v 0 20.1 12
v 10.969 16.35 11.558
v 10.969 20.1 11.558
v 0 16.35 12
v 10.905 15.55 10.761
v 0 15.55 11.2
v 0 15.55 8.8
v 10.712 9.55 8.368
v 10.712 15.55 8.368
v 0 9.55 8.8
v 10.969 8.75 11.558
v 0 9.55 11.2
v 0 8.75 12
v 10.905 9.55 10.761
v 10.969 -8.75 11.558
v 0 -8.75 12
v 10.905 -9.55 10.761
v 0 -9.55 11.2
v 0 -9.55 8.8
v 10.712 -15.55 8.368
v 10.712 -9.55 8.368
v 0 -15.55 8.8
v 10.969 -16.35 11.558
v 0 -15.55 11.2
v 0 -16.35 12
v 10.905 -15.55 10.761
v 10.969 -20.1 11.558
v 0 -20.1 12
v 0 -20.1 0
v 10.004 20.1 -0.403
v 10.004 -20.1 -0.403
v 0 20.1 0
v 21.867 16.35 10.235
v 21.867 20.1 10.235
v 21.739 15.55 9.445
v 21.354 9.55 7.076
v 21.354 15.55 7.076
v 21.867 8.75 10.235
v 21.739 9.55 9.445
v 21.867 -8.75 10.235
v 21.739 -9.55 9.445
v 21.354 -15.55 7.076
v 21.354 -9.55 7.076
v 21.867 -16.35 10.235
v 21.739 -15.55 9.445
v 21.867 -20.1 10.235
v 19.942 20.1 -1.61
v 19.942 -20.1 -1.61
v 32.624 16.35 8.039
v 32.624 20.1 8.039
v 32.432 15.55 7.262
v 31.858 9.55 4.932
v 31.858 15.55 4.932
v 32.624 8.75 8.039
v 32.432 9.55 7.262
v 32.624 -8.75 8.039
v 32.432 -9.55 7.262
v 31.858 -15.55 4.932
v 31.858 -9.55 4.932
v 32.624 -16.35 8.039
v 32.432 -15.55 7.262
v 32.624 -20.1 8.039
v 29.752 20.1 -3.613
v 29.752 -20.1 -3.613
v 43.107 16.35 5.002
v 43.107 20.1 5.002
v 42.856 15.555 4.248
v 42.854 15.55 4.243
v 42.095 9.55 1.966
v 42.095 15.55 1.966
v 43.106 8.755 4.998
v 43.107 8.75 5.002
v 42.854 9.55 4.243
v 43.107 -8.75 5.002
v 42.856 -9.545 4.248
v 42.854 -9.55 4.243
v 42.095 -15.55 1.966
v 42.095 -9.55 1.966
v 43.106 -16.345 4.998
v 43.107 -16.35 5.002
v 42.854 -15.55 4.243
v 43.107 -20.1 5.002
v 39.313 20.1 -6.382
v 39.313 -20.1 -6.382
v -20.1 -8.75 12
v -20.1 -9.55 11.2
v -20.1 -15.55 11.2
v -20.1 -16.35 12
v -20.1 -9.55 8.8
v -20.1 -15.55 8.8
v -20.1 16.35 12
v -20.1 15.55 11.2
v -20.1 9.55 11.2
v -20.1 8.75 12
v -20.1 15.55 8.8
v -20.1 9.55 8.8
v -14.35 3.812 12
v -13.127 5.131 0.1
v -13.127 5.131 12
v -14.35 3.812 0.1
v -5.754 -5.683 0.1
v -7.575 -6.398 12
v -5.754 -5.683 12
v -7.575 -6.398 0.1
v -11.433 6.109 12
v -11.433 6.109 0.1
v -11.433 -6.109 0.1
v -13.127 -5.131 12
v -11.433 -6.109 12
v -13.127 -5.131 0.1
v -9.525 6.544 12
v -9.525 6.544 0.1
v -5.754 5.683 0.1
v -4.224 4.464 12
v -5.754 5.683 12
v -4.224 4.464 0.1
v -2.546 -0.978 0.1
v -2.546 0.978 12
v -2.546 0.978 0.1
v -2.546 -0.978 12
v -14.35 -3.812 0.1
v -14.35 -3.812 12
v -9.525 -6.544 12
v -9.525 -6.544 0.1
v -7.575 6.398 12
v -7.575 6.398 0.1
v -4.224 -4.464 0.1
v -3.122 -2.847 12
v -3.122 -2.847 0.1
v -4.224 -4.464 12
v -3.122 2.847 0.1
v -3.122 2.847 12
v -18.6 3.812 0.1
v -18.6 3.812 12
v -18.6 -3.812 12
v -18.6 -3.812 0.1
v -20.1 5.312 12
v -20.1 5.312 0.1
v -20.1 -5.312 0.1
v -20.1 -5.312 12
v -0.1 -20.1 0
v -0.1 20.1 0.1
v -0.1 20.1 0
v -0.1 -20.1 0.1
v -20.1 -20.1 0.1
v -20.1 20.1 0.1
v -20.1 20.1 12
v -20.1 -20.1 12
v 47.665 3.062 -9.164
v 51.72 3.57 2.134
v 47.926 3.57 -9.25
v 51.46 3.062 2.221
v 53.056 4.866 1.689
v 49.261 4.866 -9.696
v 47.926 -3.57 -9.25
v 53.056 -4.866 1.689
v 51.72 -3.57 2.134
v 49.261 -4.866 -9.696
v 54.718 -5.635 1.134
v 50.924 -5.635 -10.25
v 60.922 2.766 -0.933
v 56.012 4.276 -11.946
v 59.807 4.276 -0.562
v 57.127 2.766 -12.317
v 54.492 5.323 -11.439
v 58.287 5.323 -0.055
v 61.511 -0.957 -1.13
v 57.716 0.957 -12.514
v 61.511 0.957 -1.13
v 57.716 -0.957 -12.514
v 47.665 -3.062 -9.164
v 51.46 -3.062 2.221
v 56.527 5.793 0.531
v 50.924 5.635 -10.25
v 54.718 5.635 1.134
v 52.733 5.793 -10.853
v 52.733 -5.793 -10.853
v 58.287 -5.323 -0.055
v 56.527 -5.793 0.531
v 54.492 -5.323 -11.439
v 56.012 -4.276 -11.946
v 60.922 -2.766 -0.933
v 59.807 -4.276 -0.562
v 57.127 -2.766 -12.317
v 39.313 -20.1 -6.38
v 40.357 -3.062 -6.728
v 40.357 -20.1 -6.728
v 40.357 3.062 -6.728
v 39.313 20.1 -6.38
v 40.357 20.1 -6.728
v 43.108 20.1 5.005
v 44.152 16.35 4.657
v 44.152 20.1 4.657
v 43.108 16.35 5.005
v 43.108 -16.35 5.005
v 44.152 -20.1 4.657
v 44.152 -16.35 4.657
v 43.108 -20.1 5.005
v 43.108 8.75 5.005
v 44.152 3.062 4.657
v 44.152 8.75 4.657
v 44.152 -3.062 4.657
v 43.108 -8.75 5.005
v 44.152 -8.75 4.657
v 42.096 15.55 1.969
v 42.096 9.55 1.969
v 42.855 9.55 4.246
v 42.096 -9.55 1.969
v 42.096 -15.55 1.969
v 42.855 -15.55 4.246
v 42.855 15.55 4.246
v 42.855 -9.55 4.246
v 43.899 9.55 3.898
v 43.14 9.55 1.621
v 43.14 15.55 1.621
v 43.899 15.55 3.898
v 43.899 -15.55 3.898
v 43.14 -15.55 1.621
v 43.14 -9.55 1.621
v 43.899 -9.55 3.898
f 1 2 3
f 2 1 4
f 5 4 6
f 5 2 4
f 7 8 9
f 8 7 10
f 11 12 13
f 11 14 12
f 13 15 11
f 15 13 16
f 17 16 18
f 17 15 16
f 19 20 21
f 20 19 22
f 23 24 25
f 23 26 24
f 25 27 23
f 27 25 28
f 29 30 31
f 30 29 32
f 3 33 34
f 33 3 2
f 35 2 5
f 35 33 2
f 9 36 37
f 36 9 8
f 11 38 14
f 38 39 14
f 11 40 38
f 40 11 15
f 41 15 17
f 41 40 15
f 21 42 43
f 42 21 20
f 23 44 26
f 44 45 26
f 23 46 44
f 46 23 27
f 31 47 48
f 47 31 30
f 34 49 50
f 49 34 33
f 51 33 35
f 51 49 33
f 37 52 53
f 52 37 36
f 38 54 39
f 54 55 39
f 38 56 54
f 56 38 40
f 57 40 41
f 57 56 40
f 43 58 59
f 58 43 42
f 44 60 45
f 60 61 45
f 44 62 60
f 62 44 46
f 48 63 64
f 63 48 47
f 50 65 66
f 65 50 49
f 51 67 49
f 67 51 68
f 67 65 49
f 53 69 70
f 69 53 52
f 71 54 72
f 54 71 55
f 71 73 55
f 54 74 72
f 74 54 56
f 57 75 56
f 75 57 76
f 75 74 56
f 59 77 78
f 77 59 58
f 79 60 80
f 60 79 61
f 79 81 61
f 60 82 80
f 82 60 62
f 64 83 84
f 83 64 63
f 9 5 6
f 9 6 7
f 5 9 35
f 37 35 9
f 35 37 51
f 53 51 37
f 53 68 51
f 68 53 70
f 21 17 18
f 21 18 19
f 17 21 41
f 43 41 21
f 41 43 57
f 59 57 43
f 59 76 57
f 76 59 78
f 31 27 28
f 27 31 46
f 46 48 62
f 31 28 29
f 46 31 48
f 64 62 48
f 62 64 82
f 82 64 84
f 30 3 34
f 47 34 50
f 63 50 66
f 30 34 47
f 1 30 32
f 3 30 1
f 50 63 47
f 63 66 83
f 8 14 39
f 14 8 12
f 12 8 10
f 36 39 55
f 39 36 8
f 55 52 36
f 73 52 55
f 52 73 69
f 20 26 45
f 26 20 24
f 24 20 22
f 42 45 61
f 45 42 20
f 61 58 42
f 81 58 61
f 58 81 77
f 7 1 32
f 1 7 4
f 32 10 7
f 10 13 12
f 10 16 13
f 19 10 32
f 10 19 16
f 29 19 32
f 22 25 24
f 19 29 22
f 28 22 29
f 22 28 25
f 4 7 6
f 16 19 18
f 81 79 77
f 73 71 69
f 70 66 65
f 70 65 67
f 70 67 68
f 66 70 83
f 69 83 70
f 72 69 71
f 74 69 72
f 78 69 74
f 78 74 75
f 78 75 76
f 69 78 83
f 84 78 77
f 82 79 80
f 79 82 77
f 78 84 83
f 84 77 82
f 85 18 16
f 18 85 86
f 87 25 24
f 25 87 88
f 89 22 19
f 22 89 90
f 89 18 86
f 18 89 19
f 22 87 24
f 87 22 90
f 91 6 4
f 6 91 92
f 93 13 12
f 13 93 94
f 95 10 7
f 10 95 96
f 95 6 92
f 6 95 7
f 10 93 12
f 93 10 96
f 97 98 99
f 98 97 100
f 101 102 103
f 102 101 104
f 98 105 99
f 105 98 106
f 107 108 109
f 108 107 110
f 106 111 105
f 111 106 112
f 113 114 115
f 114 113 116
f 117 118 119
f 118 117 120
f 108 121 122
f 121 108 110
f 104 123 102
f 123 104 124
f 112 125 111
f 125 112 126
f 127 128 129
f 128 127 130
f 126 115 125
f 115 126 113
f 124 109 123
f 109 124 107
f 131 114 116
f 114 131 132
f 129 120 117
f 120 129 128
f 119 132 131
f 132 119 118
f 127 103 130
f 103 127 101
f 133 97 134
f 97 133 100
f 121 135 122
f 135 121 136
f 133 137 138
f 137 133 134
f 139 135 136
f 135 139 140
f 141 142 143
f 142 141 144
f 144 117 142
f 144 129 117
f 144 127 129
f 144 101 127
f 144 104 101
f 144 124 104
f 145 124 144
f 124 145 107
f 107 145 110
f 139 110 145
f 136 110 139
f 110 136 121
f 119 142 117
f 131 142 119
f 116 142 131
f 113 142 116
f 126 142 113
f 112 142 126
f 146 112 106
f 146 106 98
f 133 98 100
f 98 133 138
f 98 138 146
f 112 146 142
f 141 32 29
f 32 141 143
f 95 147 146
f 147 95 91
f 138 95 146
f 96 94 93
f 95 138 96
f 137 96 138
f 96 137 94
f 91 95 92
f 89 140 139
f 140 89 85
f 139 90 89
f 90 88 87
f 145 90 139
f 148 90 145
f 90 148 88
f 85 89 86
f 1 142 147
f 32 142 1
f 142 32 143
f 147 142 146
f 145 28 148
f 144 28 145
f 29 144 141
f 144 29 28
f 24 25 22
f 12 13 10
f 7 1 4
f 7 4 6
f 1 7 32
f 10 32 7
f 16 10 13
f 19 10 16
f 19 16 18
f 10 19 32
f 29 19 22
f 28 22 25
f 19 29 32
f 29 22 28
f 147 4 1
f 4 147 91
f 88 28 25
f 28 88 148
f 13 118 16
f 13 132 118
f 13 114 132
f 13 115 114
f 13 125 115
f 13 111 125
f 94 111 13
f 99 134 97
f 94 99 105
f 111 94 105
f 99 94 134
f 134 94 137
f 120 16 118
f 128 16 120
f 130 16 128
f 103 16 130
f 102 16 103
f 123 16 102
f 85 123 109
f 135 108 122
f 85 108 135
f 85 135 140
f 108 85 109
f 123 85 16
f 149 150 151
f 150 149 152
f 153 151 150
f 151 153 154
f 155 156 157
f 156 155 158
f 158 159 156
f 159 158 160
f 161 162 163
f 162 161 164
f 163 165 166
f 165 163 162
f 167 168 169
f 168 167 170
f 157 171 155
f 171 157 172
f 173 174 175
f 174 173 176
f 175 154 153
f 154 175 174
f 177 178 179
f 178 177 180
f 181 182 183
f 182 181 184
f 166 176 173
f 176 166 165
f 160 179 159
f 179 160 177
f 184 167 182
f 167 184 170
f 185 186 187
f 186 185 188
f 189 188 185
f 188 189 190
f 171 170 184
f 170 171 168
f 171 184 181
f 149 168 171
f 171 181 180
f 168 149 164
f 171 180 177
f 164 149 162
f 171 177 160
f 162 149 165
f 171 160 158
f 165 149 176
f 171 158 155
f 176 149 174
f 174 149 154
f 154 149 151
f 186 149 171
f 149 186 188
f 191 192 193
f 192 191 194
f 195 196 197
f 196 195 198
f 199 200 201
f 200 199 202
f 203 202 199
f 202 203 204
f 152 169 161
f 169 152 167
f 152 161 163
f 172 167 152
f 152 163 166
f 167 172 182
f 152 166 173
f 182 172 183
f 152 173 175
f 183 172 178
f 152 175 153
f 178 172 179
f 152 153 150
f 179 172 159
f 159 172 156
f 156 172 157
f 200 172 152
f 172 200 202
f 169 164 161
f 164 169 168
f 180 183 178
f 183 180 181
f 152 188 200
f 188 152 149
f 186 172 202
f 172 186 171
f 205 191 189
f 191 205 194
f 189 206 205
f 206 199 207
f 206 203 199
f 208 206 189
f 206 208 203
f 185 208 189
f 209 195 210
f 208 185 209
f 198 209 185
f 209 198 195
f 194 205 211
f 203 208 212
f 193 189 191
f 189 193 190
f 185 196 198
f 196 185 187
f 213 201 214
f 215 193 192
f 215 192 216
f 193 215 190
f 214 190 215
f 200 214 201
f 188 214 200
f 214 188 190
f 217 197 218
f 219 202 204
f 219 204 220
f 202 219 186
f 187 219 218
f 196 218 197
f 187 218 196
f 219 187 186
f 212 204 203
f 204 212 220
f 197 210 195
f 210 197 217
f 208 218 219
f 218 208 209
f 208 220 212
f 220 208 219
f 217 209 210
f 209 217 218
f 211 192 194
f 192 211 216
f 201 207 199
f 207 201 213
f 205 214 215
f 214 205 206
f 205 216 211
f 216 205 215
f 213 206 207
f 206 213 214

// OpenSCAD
// file: brio.scad
th=12;
tw=40.2;

rs=25.1;
rd=3.2;
rw=6;

xd=11.815;
xdia=12.375;
xw=6.875;

gap=1.5;

fd=xd-gap/2;
fdia=xdia+gap/2;
fw=xw+gap/2;
fc=1.5;

md=xd+gap/2;
mdia=xdia-gap/2;
mw=xw-gap/2;

module railpeg (h=th, xover=1){

	translate([-md,0,0])
	union(){
		cylinder(r=mdia/2, h=h, center=true);

		translate([0,-mw/2,-h/2])
		cube([md+xover, mw, h]);

	}

}




module negativerailhole (h=th, xover=1){

	difference(){
		union(){
			translate([-fd,0,0])
			union(){
				cylinder(r=fdia/2, h=h, center=true);

				translate([0,-fw/2,-h/2])
				cube([fd, fw, h]);

			}
				translate([-fw/2-fc, 0,-h/2])
				rotate([0,0,-45])
				cube([fw*2, fw*2, h]);
		}

		translate([fw*3+xover, 0,0])
		cube([fw*6, fw*6, h*2], center=true);

	}
}



module rail (l=100, typea="M", typeb="F", edget=0, edgew=0){

	translate([0,0,th/2])
	difference(){
		union(){
			cube([l, tw, th], center=true);

			if(typea == "M" || typea == "m")
			{
				translate([-l/2,0,0])
				railpeg(h=th);

				translate([l/2-1,-tw/2,-th/2-edget])
				cube([1+edgew,tw,edget+.1]);
			}

			if(typeb == "M" || typeb == "m")
			{
				mirror([1,0,0])
				translate([-l/2,0,0])
				railpeg(h=th);

				translate([-l/2-edgew,-tw/2,-th/2-edget])
				cube([1+edgew,tw,edget+.1]);
			}
		}
		for(y=[-rs/2, rs/2])
			translate([0,y,th/2-rd/2]){
				translate([0,0,.5])
				cube([l+1, rw, rd+1], center=true);
				for(r=[0,180])
					rotate([0,0,r])
					translate([0,rw/2,rd/4])
					rotate([45,0,0])
					translate([-l/2-.5,-rd*sqrt(2)/2,0])
					cube([l+1, rd*sqrt(2), rd/3]);
			}

		if(typea == "F" || typea == "F")
		{
			mirror([1,0,0])
			translate([l/2,0,0])
			negativerailhole(h=th+1);
		
			translate([-l/2-edgew,-tw/2,-th/2-edget])
			cube([20+edgew,tw,edget+.1]);
		}
		
		
		if(typeb == "F" || typeb == "F")
		{
			translate([l/2,0,0])
			negativerailhole(h=th+1);

			translate([l/2-20,-tw/2,-th/2-edget])
			cube([20+edgew,tw,edget+.1]);
		}
	}
}
//negativerailhole();
//railpeg();

//rail(40);
rail (l=130, typea="M", typeb="M");
// file: duplo.scad
mdia=9.43;
mt=1.21;
mh=4.55;

s=16;
h=19.2/2;

fdia=13.15;
ft=1.21;
fover=.00; //measured .05, but didn't fit on my printer
fc=0;
fca=2;

externalundersize=.11;

wt=1.6;

$fn=50;

module duplobottom(nw=2, nl=3, nh=2)
{
	union(){
		difference(){
			translate([0,0,nh*h/2])
			cube([nw*s-2*externalundersize, nl*s-2*externalundersize, nh*h], center=true);

			translate([0,0,nh*h/2-wt])
			cube([nw*s-2*externalundersize-2*wt, nl*s-2*externalundersize-2*wt, nh*h], center=true);
		}


		difference(){
			union(){
				for(x=[0:nw-2])
				for(y=[0:nl-2])
				translate([(x-nw/2+1)*s,(y-nl/2+1)*s,0]){
					translate([0,0,fc])
					cylinder(r=fdia/2, h=nh*h-fc);
					cylinder(r2=fdia/2, r1=fdia/2-fc/fca, h=fc+.01);
				}

				for(x=[0:nw-2])
				translate([(x-nw/2+1)*s-ft/2,-(nl*s-2*externalundersize)/2,mh])
				cube([ft, nl*s-2*externalundersize, nh*h-mh]);

				for(y=[0:nl-2])
				translate([-(nw*s-2*externalundersize)/2, (y-nl/2+1)*s-ft/2,mh])
				cube([nw*s-2*externalundersize, ft, nh*h-mh]);

				for(x=[0:nw-1])
				translate([(x-nw/2+.5)*s-ft/2,-(nl*s-2*externalundersize)/2,0])
				difference(){
					cube([ft, nl*s-2*externalundersize, nh*h]);
					translate([-1,((nl*s-2*externalundersize) - (s*(nl-1)+mdia-2*fover))/2,-1])
					cube([ft+2, s*(nl-1)+mdia-2*fover, nh*h+2]);
				}

				for(y=[0:nl-1])
				translate([-(nw*s-2*externalundersize)/2,(y-nl/2+.5)*s-ft/2,0])
				difference(){
					cube([nw*s-2*externalundersize, ft, nh*h]);
					translate([((nl*s-2*externalundersize) - (s*(nl-1)+mdia-2*fover))/2,-1,-1])
					cube([s*(nw-1)+mdia-2*fover, ft+2, nh*h+2]);
				}
			}

			for(x=[0:nw-2])
			for(y=[0:nl-2])
			translate([(x-nw/2+1)*s,(y-nl/2+1)*s,0]){
				translate([0,0,fc-1])
				cylinder(r=fdia/2-ft, h=nh*h+2);
				translate([0,0,-.01])
				cylinder(r2=fdia/2-ft, r1=fdia/2-ft-fc/fca, h=fc+.02);
			}
		}
	}
}

module duplotop(nw=2, nl=3, nh=2)
{
	difference(){

		union(){
			translate([0,0,wt/2])
			cube([nw*s-2*externalundersize, nl*s-2*externalundersize, wt], center=true);

			for(x=[0:nw-1])
			for(y=[0:nl-1])
			translate([(x-nw/2+.5)*s,(y-nl/2+.5)*s,0])
			cylinder(r=mdia/2, h=mh+wt);
		}

		for(x=[0:nw-1])
		for(y=[0:nl-1])
		translate([(x-nw/2+.5)*s,(y-nl/2+.5)*s,0]){
			translate([0,0,wt])
			cylinder(r=mdia/2-mt, h=mh+wt);
		}
	}

}

module duplo(nw=2, nl=2, nh=1){
	union(){
		translate([0,0,nh*h-wt])
		duplotop(nw=nw, nl=nl, nh=nh);
		duplobottom(nw=nw, nl=nl, nh=nh);
	}
}

//duplobottom(nw=2, nl=2, nh=1);
//duplotop(nw=2, nl=3, nh=1);
duplo(nw=2, nl=2, nh=2);
// main file
use<duplo.scad>
use<brio.scad>


duploh=19.2/2;
duploexternalundersize=.11;

briow=40.2;
brioh=12;


module briotoduplo(nl=2, nw=2, slope=1/3, edge=6){

	ang=atan(slope);
	l=max(35, 16*nl/cos(ang));
	h=l*abs(sin(ang));

	union(){
		rotate([0,0,90])
		duplobottom(nw=2, nl=nl, nh=1);

		translate([0,0,duploh+h/2])
		rotate([0,ang,0])
//		rail(l-edge*2);
		translate([6,0,0])
		rail(l-edge*2-5);

	//	translate([-16*nl/2,-16*nw/2,duploh])
		difference(){
			hull(){
				translate([0,0,duploh+h/2-1])
				rotate([0,ang,0])
				cube([l,briow,2.2], center=true);

				cube([16*nl,16*nw,.2], center=true);
			}
			translate([0,0,duploh/2-.3])
			cube([16*nl-duploexternalundersize*2-.2,16*nw-duploexternalundersize*2-.2,duploh+.2], center=true);

			}


		intersection(){

			hull(){
			translate([0,0,duploh+h/2])
				rotate([0,ang,0])
		//		rail(l-edge*2);
				translate([6,0,0])
				intersection(){
					rail(l-edge*2-5);

					cube([1000,1000,.2], center=true);
				}

				translate([-((16*nl)/2-duploexternalundersize-1),0,0])
				cylinder(r=1, h=1);
			}

			translate([-100-((16*nl)/2-duploexternalundersize-.1),-50,0])
			cube([100,100,1000]);
	}	


	}


}

module ramp(d=80, slope=1/3, edge=5, typea="F", typeb="M"){

	sign=abs(slope)/slope;
	ang=atan(slope);
	r=d/(ang*3.14159/180);

	lena = typea=="M"?1:20;
	lenb = typeb=="M"?1:20;

	union(){
		rotate([0,0,-90])
		intersection(){

			translate([0,0,r])
			rotate([0,90,0])
			rotate_extrude(convexity = 10, $fn=abs(d*36/ang))
			translate([abs(r), 0, 0])
			projection(cut = true)
			rotate([0,-90*sign,0])
			rail(300);

			translate([-500,0,-abs(r)])
			cube([1000,1000,2*abs(r)]);

			translate([0,0,r])
			rotate([ang,0,0])
			translate([-500,-1000,-r-500])
			cube([1000,1000,1000]);
		}

			translate([-lena/2-.05,0,0])
			rail(l=lena+.1,typea=typea,typeb="");

			translate([0,0,r])
			rotate([0,-ang,0])
			translate([lenb/2+.05,0,-r])
			rail(l=lenb+.1,typeb=typeb,typea="");


			if(sign > 0)//base for sitting on ground
			{


				translate([0,-briow/2,0])
				difference(){
					cube([r*sin(ang)+(lenb+edge)*cos(ang), briow, 1000]);

					translate([0,briow*2,r])
					rotate([90,0,0])
					cylinder(r=r-.1, h=briow*3, $fn=150);
				
					translate([0,-briow,r])
					rotate([0,-ang,0])
					translate([0,0,.1-r])
					cube([1000, briow*3, 1000]);
					}


				if(typeb=="M")//peg support
				{
					hull(){
						translate([0,0,r])
						rotate([0,-ang,0])
						translate([lenb/2+.05,0,-r])
						intersection(){
							rail(l=lenb+.1,typeb=typeb,typea="");

							translate([500+lenb,0,0])
							cube([1000,1000,.2], center=true);
						}

						translate([r*sin(ang)+(lenb+edge)*cos(ang)-1,0,0])
						cylinder(r=1, h=1);
					}
			
				}

			}



	}

}

//rail(40);
//negativerailhole();
//railpeg();


//duplobottom(nw=2, nl=2, nh=1);
//duplotop(nw=2, nl=3, nh=1);
//duplo(nw=2, nl=2, nh=2);


//briotoduplo(nl=2, nw=2, slope=1/3, edge=6);
//briotoduplo(nl=2, nw=2, slope=-1/3, edge=6);

//ramp(d=80, slope=1/3, edge=5, typea="F", typeb="M");
//ramp(d=80, slope=1/3, edge=5, typea="M", typeb="F");

ramp(d=40, slope=-1/3, edge=5, typea="F", typeb="M");
